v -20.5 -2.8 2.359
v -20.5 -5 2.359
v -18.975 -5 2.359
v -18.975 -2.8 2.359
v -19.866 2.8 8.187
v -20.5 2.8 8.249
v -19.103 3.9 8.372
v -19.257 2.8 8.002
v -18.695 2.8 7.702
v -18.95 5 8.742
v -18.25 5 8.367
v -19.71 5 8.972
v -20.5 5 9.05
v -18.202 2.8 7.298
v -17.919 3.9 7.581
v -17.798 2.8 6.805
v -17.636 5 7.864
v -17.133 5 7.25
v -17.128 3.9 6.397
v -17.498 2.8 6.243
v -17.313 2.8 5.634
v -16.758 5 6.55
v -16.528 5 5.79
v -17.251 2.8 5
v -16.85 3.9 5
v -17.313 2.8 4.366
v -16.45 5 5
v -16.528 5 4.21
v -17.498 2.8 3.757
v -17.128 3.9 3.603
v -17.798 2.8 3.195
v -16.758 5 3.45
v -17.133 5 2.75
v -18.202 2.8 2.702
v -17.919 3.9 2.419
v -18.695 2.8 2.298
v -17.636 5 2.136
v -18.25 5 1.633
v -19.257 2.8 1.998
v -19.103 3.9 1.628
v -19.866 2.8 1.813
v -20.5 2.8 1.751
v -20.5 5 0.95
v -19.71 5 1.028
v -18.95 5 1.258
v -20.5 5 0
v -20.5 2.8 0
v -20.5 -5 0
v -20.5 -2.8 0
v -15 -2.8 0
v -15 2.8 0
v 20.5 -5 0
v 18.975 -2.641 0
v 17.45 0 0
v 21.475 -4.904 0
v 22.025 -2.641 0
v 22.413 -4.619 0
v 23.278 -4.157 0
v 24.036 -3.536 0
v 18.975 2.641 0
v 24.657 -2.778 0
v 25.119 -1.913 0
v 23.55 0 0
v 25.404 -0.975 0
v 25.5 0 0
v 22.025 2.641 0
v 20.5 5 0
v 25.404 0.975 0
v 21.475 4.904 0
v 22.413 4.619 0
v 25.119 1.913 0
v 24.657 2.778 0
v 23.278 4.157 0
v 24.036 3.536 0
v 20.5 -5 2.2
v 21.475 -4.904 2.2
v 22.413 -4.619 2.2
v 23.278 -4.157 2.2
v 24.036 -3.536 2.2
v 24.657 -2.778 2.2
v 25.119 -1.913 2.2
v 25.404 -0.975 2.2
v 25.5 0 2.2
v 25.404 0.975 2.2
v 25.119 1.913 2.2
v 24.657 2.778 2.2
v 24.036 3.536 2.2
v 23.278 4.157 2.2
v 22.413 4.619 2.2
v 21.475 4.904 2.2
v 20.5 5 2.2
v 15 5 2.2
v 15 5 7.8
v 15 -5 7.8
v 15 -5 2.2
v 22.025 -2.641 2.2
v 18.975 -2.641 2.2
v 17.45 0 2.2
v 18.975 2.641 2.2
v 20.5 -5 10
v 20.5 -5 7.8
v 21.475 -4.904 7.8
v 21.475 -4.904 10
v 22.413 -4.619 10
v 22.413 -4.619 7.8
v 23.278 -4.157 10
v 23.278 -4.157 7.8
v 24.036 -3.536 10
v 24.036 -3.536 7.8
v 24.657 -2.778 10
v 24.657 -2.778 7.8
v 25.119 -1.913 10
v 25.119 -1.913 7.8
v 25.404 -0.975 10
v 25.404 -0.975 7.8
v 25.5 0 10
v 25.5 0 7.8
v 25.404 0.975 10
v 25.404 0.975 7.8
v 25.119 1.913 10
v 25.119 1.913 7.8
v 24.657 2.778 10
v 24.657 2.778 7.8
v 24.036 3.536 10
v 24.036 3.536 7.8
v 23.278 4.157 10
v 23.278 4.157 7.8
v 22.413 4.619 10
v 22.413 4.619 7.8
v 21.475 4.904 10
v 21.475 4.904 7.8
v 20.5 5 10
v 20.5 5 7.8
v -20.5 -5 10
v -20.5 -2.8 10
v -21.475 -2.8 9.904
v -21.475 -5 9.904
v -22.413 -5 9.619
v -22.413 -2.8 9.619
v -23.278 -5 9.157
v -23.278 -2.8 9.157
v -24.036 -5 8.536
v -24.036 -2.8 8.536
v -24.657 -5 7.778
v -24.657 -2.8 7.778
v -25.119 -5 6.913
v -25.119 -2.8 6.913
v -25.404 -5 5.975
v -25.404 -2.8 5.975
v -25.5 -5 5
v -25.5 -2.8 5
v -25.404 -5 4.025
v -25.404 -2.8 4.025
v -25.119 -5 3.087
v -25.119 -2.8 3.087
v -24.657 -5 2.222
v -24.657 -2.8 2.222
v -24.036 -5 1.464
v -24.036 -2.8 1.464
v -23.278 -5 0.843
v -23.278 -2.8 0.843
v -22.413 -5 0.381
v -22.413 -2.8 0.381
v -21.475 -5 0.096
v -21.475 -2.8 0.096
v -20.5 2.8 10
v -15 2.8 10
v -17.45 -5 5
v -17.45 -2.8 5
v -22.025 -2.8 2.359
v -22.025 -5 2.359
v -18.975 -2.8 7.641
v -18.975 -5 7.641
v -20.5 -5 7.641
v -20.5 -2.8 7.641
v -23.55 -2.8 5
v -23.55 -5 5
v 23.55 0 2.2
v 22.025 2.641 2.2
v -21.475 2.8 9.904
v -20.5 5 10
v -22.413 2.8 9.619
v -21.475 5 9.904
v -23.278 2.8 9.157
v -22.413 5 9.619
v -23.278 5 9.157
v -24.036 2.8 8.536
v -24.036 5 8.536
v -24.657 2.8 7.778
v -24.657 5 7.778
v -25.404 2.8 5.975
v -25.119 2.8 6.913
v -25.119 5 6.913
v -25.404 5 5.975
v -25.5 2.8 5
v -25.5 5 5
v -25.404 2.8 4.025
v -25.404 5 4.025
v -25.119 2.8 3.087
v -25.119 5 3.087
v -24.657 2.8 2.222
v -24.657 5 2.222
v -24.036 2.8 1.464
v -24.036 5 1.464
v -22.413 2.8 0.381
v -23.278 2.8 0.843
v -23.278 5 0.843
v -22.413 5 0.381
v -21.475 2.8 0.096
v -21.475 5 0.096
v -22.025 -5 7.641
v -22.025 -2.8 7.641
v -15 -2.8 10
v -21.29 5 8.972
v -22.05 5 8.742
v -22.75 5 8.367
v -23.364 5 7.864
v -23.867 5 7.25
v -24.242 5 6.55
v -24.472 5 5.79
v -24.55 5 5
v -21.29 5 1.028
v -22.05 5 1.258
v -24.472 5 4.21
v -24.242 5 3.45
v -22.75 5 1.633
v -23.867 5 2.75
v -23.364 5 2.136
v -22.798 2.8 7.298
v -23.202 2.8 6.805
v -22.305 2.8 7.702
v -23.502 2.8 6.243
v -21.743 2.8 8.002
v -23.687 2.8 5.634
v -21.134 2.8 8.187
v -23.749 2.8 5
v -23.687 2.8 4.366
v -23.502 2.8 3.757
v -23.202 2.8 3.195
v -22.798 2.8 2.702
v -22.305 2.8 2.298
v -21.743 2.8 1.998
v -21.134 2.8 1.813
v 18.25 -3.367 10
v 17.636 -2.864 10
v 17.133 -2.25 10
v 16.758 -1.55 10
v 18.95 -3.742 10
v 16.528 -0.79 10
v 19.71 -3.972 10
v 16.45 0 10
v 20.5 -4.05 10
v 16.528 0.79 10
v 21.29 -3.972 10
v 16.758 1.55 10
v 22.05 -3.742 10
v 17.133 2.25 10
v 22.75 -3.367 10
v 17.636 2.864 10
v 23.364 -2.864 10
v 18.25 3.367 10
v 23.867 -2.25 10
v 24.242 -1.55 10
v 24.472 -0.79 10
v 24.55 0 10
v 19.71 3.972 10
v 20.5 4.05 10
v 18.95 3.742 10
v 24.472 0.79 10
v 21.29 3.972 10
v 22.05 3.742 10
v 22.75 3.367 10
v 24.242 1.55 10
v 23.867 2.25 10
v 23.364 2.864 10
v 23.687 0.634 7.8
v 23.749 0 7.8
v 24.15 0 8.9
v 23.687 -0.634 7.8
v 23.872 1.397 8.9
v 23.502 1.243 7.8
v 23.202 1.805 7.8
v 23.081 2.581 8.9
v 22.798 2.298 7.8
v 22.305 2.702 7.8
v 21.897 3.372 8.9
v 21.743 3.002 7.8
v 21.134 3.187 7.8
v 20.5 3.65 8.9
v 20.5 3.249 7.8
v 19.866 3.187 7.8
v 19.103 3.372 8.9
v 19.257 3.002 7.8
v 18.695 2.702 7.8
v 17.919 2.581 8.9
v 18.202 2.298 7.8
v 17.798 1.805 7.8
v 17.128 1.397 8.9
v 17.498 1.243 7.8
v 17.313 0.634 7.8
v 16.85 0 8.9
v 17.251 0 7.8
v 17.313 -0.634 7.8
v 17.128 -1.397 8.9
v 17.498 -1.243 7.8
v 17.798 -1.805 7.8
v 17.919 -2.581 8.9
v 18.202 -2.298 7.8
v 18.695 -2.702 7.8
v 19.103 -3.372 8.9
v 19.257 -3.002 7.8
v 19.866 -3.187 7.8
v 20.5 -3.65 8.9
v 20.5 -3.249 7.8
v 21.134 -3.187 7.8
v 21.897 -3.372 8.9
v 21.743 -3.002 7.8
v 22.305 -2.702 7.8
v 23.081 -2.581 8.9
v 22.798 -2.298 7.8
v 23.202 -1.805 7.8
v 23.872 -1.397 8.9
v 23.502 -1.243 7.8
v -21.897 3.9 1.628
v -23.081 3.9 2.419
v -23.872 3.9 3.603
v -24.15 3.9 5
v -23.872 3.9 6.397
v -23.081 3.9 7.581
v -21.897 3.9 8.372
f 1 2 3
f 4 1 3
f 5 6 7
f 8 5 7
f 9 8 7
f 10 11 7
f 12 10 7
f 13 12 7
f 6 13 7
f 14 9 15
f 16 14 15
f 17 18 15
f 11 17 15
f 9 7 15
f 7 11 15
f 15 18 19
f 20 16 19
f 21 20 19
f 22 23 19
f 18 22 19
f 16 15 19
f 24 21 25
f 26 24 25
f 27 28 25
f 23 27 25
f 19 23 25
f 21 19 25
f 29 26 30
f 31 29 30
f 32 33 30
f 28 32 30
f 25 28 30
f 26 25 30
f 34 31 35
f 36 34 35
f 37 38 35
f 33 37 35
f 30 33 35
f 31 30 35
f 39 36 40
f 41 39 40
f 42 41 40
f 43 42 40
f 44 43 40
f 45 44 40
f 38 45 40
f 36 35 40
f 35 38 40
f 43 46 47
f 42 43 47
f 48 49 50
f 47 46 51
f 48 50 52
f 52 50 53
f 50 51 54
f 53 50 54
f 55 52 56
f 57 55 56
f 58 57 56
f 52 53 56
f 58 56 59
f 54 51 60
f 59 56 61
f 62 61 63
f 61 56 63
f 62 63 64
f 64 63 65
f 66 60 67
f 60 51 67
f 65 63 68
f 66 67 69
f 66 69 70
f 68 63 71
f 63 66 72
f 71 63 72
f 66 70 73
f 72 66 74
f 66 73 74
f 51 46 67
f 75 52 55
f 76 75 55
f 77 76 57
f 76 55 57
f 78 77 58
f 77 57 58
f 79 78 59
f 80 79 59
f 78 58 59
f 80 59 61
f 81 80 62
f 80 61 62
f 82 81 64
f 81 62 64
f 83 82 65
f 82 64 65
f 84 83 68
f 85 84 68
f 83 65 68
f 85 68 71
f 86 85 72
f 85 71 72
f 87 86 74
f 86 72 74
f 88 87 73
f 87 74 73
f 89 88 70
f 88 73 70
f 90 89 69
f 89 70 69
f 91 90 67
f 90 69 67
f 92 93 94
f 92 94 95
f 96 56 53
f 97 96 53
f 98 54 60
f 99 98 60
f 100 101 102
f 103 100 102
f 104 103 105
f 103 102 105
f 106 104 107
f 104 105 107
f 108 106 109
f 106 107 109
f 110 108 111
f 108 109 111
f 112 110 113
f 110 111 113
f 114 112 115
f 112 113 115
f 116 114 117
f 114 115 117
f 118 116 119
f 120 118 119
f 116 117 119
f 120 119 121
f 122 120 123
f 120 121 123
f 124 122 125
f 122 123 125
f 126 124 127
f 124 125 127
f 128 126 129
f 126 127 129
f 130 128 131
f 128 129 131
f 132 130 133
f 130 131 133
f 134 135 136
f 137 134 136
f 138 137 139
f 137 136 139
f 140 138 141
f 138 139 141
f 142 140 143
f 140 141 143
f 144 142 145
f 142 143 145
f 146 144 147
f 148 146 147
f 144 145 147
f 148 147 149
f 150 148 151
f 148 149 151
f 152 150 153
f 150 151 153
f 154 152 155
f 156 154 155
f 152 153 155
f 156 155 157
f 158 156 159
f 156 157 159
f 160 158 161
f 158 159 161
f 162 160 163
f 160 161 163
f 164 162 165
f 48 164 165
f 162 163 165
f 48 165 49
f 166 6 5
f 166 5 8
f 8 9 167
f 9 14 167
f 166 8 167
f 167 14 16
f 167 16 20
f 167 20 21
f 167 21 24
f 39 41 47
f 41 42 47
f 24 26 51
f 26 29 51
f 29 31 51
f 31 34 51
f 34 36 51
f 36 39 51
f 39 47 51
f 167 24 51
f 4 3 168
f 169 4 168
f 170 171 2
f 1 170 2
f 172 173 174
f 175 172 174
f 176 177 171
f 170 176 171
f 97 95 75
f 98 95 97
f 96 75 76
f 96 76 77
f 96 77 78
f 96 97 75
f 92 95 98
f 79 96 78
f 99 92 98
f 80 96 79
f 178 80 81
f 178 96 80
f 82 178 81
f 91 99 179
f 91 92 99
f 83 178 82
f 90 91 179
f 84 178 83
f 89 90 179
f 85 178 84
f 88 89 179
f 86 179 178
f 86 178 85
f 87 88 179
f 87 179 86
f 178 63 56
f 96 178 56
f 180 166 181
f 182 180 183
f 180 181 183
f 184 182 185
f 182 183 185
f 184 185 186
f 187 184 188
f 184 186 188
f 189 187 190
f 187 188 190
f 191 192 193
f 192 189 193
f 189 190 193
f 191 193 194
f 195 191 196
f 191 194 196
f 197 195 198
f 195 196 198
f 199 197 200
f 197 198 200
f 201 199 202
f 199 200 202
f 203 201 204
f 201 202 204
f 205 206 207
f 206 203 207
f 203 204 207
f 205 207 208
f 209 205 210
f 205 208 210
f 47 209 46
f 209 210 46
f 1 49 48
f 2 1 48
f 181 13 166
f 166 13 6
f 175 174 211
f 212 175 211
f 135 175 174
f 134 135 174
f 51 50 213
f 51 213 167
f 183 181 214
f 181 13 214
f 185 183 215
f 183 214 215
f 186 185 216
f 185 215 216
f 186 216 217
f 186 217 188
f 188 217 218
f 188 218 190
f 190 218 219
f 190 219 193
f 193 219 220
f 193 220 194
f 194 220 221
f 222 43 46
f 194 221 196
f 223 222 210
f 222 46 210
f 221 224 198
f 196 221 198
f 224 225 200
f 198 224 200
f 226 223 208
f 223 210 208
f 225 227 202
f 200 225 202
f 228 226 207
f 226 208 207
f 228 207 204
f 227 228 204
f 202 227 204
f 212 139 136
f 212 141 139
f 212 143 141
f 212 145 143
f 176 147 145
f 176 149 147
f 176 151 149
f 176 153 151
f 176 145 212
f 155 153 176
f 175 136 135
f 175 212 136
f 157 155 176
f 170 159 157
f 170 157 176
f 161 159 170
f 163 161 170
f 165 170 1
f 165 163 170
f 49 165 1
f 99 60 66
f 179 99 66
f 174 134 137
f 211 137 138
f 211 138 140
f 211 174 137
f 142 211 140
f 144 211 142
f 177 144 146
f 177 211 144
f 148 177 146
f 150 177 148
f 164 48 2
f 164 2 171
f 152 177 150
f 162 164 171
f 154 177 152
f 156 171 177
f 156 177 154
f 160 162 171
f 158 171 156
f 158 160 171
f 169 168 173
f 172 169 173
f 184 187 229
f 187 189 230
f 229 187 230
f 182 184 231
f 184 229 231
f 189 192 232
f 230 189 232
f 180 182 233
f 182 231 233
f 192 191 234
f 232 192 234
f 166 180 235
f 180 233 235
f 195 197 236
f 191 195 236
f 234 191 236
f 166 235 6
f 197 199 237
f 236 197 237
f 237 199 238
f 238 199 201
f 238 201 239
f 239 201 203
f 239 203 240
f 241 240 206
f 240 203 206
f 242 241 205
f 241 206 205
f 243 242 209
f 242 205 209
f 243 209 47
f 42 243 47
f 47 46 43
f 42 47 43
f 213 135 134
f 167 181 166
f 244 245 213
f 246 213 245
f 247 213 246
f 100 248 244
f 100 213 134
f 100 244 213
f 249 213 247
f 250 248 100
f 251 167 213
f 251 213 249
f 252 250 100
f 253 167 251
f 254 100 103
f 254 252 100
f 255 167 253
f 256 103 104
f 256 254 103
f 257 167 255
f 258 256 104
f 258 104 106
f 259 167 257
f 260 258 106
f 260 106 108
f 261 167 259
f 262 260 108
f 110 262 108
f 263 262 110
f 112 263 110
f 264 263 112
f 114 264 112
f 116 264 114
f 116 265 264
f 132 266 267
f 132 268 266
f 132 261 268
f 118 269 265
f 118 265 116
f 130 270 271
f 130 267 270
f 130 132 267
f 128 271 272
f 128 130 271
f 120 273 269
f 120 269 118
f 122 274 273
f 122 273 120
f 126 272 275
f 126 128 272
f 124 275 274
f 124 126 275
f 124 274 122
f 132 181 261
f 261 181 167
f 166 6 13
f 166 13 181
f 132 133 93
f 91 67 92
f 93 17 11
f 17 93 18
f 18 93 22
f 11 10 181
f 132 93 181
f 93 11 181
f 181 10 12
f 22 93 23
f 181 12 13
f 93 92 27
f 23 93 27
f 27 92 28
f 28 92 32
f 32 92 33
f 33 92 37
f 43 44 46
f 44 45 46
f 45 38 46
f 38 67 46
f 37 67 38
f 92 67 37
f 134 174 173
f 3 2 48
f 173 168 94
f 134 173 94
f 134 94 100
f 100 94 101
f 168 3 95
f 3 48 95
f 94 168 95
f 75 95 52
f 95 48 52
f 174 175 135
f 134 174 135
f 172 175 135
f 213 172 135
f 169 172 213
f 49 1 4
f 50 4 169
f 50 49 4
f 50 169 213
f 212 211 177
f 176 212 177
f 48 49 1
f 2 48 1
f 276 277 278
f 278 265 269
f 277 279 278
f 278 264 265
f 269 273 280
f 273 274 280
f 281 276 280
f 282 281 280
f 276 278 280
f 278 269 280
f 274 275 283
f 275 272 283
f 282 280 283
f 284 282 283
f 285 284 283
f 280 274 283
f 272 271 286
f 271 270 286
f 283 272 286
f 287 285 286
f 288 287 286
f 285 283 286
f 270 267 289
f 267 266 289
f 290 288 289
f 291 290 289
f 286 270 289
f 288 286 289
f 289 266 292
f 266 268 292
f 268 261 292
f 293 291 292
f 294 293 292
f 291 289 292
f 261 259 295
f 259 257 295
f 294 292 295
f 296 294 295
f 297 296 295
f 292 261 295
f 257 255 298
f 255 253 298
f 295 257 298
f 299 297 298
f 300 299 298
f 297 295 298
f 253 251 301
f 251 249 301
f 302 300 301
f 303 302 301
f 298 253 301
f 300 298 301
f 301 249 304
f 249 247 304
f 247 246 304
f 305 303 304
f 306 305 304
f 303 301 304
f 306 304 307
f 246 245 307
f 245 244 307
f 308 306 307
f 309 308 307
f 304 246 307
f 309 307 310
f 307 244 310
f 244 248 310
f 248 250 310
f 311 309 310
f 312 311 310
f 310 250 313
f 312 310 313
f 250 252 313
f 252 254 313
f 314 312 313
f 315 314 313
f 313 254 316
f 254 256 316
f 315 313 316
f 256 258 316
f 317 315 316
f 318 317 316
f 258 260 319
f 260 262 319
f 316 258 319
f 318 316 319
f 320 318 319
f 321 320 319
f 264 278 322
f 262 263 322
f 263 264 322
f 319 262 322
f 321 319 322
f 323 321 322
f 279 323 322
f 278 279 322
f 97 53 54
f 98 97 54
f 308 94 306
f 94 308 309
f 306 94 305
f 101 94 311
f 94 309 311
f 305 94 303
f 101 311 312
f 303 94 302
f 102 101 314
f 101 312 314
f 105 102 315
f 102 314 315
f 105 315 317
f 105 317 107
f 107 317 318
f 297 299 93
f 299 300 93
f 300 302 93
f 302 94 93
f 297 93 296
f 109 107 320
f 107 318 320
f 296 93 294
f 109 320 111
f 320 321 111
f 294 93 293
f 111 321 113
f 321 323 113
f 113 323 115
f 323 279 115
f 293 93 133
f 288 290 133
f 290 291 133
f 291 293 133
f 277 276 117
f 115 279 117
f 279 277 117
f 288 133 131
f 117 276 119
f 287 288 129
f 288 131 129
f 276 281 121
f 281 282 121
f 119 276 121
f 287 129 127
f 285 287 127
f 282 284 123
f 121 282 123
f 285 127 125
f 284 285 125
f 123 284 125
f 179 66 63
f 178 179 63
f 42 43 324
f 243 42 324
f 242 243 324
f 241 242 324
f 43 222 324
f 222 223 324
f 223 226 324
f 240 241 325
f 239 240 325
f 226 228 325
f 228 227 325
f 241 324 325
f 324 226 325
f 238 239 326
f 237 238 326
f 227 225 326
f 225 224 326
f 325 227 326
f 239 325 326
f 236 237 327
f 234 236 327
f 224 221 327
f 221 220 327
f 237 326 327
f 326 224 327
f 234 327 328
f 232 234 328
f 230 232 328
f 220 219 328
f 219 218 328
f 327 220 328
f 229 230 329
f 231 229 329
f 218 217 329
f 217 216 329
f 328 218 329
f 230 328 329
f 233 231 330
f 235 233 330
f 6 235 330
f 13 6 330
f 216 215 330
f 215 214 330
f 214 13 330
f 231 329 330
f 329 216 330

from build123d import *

# Parameters (mm, degrees)
EXTRUDE_1_DEPTH      = 10
SKETCH_3_W           = 10.5
SKETCH_3_H           = 5.6
CUT_EXTRUDE_2_DEPTH  = 30.159046624
EXTRUDE_5_DEPTH      = 5
SKETCH_2_R           = 4.05
CUT_EXTRUDE_4_DEPTH  = 2.4
CUT_EXTRUDE_4_DRAFT  = -20
SKETCH_11_W          = 10.5
SKETCH_11_H          = 5.6
CUT_EXTRUDE_11_DEPTH = 28.843311585
CUT_EXTRUDE_13_DEPTH = 2.5
CUT_EXTRUDE_14_DEPTH = 2.5


# Read off the part's stored shape, not the designer's step: 除料-伸長10
with BuildPart() as part:
    # 草圖1 → 填料-伸長1 (new body)
    with BuildSketch(Plane.XY):
        with BuildLine():
            Line((-20.5, 5), (-20.5, -5))
            Line((-20.5, -5), (20.5, -5))
            ThreePointArc((20.5, -5), (25.5, 0), (20.5, 5))
            Line((20.5, 5), (-20.5, 5))
        make_face()
    extrude(amount=EXTRUDE_1_DEPTH)

    # 草圖3 → 除料-伸長2 (cut, through all)
    with BuildSketch(Plane(origin=(0, 5, 0), x_dir=(1, 0, 0), z_dir=(0, 1, 0))):
        with Locations((20.25, -5)):
            Rectangle(SKETCH_3_W, SKETCH_3_H)
    extrude(amount=-CUT_EXTRUDE_2_DEPTH, mode=Mode.SUBTRACT)


with BuildPart() as body_2:
    # 草圖10 → 填料-伸長5 (new, symmetric)
    with BuildSketch(Plane(origin=(0, 0, 0), x_dir=(1, 0, 0), z_dir=(0, 1, 0))):
        with BuildLine():
            Line((-20.5, 0), (-20.5, -10))
            ThreePointArc((-20.5, -10), (-25.5, -5), (-20.5, 0))
        make_face()
    extrude(amount=EXTRUDE_5_DEPTH, both=True)


with BuildPart() as cut_extrude_4_tool:
    # 草圖2 → 除料-伸長4 (with draft: the straight prism first)
    with BuildSketch(Plane.XY.offset(10)):
        with Locations((20.5, 0)):
            Circle(SKETCH_2_R)
    extrude(amount=-CUT_EXTRUDE_4_DEPTH)
    # 除料-伸長4: the draft: its side faces are tilted about the plane it starts from
    cut_extrude_4_sides = [cut_extrude_4_tool.faces().sort_by_distance(p)[0] for p in [
        (16.45, 0, 8.8),
    ]]
    draft(cut_extrude_4_sides, Plane.XY.offset(10), CUT_EXTRUDE_4_DRAFT)


with BuildPart() as part_1:
    add(part.part)

    # 除料-伸長4: cut by cut_extrude_4_tool
    add(cut_extrude_4_tool.part, mode=Mode.SUBTRACT)


with BuildPart() as cut_extrude_10_tool:
    # 除料-伸長10 outline → 除料-伸長10 (revolve)
    with BuildSketch(Plane(origin=(-20.5, 0, 5), x_dir=(1, 0, 0), z_dir=(0, 0, 1))):
        Polygon((0, 5), (0, 2), (2.958089297, 2), (4.05, 5), align=None)
    revolve(axis=Axis((-20.5, 0, 5), (0, 1, 0)))


with BuildPart() as part_2:
    add(part_1.part)

    # 除料-伸長10: cut by cut_extrude_10_tool
    add(cut_extrude_10_tool.part, mode=Mode.SUBTRACT)


with BuildPart() as body_2_1:
    add(body_2.part)

    # 除料-伸長10: cut by cut_extrude_10_tool
    add(cut_extrude_10_tool.part, mode=Mode.SUBTRACT)


with BuildPart() as cut_extrude_11_tool:
    # 草圖11 → 除料-伸長11 (new, through all)
    with BuildSketch(Plane.XY):
        with Locations((-20.25, 0)):
            Rectangle(SKETCH_11_W, SKETCH_11_H)
    extrude(amount=CUT_EXTRUDE_11_DEPTH)


with BuildPart() as part_3:
    add(part_2.part)

    # 除料-伸長11: cut by cut_extrude_11_tool
    add(cut_extrude_11_tool.part, mode=Mode.SUBTRACT)

    # 草圖15 → 除料-伸長13 (cut)
    with BuildSketch(Plane(origin=(0, 0, 0), x_dir=(-1, 0, 0), z_dir=(0, 0, -1))):
        Polygon((-18.975, 2.641377482), (-22.025, 2.641377482), (-23.55, 0), (-22.025, -2.641377482), (-18.975, -2.641377482), (-17.45, 0), align=None)
    extrude(amount=-CUT_EXTRUDE_13_DEPTH, mode=Mode.SUBTRACT)


with BuildPart() as body_2_2:
    add(body_2_1.part)

    # 除料-伸長11: cut by cut_extrude_11_tool
    add(cut_extrude_11_tool.part, mode=Mode.SUBTRACT)


with BuildPart() as cut_extrude_14_tool:
    # 草圖16 → 除料-伸長14 (new body)
    with BuildSketch(Plane.XZ.offset(5)):
        Polygon((-17.45, 5), (-18.975, 7.641377482), (-22.025, 7.641377482), (-23.55, 5), (-22.025, 2.358622518), (-18.975, 2.358622518), align=None)
    extrude(amount=-CUT_EXTRUDE_14_DEPTH)


with BuildPart() as part_4:
    add(part_3.part)

    # 除料-伸長14: cut by cut_extrude_14_tool
    add(cut_extrude_14_tool.part, mode=Mode.SUBTRACT)


with BuildPart() as body_2_3:
    add(body_2_2.part)

    # 除料-伸長14: cut by cut_extrude_14_tool
    add(cut_extrude_14_tool.part, mode=Mode.SUBTRACT)


solid = Compound([part_4.part, body_2_3.part])
